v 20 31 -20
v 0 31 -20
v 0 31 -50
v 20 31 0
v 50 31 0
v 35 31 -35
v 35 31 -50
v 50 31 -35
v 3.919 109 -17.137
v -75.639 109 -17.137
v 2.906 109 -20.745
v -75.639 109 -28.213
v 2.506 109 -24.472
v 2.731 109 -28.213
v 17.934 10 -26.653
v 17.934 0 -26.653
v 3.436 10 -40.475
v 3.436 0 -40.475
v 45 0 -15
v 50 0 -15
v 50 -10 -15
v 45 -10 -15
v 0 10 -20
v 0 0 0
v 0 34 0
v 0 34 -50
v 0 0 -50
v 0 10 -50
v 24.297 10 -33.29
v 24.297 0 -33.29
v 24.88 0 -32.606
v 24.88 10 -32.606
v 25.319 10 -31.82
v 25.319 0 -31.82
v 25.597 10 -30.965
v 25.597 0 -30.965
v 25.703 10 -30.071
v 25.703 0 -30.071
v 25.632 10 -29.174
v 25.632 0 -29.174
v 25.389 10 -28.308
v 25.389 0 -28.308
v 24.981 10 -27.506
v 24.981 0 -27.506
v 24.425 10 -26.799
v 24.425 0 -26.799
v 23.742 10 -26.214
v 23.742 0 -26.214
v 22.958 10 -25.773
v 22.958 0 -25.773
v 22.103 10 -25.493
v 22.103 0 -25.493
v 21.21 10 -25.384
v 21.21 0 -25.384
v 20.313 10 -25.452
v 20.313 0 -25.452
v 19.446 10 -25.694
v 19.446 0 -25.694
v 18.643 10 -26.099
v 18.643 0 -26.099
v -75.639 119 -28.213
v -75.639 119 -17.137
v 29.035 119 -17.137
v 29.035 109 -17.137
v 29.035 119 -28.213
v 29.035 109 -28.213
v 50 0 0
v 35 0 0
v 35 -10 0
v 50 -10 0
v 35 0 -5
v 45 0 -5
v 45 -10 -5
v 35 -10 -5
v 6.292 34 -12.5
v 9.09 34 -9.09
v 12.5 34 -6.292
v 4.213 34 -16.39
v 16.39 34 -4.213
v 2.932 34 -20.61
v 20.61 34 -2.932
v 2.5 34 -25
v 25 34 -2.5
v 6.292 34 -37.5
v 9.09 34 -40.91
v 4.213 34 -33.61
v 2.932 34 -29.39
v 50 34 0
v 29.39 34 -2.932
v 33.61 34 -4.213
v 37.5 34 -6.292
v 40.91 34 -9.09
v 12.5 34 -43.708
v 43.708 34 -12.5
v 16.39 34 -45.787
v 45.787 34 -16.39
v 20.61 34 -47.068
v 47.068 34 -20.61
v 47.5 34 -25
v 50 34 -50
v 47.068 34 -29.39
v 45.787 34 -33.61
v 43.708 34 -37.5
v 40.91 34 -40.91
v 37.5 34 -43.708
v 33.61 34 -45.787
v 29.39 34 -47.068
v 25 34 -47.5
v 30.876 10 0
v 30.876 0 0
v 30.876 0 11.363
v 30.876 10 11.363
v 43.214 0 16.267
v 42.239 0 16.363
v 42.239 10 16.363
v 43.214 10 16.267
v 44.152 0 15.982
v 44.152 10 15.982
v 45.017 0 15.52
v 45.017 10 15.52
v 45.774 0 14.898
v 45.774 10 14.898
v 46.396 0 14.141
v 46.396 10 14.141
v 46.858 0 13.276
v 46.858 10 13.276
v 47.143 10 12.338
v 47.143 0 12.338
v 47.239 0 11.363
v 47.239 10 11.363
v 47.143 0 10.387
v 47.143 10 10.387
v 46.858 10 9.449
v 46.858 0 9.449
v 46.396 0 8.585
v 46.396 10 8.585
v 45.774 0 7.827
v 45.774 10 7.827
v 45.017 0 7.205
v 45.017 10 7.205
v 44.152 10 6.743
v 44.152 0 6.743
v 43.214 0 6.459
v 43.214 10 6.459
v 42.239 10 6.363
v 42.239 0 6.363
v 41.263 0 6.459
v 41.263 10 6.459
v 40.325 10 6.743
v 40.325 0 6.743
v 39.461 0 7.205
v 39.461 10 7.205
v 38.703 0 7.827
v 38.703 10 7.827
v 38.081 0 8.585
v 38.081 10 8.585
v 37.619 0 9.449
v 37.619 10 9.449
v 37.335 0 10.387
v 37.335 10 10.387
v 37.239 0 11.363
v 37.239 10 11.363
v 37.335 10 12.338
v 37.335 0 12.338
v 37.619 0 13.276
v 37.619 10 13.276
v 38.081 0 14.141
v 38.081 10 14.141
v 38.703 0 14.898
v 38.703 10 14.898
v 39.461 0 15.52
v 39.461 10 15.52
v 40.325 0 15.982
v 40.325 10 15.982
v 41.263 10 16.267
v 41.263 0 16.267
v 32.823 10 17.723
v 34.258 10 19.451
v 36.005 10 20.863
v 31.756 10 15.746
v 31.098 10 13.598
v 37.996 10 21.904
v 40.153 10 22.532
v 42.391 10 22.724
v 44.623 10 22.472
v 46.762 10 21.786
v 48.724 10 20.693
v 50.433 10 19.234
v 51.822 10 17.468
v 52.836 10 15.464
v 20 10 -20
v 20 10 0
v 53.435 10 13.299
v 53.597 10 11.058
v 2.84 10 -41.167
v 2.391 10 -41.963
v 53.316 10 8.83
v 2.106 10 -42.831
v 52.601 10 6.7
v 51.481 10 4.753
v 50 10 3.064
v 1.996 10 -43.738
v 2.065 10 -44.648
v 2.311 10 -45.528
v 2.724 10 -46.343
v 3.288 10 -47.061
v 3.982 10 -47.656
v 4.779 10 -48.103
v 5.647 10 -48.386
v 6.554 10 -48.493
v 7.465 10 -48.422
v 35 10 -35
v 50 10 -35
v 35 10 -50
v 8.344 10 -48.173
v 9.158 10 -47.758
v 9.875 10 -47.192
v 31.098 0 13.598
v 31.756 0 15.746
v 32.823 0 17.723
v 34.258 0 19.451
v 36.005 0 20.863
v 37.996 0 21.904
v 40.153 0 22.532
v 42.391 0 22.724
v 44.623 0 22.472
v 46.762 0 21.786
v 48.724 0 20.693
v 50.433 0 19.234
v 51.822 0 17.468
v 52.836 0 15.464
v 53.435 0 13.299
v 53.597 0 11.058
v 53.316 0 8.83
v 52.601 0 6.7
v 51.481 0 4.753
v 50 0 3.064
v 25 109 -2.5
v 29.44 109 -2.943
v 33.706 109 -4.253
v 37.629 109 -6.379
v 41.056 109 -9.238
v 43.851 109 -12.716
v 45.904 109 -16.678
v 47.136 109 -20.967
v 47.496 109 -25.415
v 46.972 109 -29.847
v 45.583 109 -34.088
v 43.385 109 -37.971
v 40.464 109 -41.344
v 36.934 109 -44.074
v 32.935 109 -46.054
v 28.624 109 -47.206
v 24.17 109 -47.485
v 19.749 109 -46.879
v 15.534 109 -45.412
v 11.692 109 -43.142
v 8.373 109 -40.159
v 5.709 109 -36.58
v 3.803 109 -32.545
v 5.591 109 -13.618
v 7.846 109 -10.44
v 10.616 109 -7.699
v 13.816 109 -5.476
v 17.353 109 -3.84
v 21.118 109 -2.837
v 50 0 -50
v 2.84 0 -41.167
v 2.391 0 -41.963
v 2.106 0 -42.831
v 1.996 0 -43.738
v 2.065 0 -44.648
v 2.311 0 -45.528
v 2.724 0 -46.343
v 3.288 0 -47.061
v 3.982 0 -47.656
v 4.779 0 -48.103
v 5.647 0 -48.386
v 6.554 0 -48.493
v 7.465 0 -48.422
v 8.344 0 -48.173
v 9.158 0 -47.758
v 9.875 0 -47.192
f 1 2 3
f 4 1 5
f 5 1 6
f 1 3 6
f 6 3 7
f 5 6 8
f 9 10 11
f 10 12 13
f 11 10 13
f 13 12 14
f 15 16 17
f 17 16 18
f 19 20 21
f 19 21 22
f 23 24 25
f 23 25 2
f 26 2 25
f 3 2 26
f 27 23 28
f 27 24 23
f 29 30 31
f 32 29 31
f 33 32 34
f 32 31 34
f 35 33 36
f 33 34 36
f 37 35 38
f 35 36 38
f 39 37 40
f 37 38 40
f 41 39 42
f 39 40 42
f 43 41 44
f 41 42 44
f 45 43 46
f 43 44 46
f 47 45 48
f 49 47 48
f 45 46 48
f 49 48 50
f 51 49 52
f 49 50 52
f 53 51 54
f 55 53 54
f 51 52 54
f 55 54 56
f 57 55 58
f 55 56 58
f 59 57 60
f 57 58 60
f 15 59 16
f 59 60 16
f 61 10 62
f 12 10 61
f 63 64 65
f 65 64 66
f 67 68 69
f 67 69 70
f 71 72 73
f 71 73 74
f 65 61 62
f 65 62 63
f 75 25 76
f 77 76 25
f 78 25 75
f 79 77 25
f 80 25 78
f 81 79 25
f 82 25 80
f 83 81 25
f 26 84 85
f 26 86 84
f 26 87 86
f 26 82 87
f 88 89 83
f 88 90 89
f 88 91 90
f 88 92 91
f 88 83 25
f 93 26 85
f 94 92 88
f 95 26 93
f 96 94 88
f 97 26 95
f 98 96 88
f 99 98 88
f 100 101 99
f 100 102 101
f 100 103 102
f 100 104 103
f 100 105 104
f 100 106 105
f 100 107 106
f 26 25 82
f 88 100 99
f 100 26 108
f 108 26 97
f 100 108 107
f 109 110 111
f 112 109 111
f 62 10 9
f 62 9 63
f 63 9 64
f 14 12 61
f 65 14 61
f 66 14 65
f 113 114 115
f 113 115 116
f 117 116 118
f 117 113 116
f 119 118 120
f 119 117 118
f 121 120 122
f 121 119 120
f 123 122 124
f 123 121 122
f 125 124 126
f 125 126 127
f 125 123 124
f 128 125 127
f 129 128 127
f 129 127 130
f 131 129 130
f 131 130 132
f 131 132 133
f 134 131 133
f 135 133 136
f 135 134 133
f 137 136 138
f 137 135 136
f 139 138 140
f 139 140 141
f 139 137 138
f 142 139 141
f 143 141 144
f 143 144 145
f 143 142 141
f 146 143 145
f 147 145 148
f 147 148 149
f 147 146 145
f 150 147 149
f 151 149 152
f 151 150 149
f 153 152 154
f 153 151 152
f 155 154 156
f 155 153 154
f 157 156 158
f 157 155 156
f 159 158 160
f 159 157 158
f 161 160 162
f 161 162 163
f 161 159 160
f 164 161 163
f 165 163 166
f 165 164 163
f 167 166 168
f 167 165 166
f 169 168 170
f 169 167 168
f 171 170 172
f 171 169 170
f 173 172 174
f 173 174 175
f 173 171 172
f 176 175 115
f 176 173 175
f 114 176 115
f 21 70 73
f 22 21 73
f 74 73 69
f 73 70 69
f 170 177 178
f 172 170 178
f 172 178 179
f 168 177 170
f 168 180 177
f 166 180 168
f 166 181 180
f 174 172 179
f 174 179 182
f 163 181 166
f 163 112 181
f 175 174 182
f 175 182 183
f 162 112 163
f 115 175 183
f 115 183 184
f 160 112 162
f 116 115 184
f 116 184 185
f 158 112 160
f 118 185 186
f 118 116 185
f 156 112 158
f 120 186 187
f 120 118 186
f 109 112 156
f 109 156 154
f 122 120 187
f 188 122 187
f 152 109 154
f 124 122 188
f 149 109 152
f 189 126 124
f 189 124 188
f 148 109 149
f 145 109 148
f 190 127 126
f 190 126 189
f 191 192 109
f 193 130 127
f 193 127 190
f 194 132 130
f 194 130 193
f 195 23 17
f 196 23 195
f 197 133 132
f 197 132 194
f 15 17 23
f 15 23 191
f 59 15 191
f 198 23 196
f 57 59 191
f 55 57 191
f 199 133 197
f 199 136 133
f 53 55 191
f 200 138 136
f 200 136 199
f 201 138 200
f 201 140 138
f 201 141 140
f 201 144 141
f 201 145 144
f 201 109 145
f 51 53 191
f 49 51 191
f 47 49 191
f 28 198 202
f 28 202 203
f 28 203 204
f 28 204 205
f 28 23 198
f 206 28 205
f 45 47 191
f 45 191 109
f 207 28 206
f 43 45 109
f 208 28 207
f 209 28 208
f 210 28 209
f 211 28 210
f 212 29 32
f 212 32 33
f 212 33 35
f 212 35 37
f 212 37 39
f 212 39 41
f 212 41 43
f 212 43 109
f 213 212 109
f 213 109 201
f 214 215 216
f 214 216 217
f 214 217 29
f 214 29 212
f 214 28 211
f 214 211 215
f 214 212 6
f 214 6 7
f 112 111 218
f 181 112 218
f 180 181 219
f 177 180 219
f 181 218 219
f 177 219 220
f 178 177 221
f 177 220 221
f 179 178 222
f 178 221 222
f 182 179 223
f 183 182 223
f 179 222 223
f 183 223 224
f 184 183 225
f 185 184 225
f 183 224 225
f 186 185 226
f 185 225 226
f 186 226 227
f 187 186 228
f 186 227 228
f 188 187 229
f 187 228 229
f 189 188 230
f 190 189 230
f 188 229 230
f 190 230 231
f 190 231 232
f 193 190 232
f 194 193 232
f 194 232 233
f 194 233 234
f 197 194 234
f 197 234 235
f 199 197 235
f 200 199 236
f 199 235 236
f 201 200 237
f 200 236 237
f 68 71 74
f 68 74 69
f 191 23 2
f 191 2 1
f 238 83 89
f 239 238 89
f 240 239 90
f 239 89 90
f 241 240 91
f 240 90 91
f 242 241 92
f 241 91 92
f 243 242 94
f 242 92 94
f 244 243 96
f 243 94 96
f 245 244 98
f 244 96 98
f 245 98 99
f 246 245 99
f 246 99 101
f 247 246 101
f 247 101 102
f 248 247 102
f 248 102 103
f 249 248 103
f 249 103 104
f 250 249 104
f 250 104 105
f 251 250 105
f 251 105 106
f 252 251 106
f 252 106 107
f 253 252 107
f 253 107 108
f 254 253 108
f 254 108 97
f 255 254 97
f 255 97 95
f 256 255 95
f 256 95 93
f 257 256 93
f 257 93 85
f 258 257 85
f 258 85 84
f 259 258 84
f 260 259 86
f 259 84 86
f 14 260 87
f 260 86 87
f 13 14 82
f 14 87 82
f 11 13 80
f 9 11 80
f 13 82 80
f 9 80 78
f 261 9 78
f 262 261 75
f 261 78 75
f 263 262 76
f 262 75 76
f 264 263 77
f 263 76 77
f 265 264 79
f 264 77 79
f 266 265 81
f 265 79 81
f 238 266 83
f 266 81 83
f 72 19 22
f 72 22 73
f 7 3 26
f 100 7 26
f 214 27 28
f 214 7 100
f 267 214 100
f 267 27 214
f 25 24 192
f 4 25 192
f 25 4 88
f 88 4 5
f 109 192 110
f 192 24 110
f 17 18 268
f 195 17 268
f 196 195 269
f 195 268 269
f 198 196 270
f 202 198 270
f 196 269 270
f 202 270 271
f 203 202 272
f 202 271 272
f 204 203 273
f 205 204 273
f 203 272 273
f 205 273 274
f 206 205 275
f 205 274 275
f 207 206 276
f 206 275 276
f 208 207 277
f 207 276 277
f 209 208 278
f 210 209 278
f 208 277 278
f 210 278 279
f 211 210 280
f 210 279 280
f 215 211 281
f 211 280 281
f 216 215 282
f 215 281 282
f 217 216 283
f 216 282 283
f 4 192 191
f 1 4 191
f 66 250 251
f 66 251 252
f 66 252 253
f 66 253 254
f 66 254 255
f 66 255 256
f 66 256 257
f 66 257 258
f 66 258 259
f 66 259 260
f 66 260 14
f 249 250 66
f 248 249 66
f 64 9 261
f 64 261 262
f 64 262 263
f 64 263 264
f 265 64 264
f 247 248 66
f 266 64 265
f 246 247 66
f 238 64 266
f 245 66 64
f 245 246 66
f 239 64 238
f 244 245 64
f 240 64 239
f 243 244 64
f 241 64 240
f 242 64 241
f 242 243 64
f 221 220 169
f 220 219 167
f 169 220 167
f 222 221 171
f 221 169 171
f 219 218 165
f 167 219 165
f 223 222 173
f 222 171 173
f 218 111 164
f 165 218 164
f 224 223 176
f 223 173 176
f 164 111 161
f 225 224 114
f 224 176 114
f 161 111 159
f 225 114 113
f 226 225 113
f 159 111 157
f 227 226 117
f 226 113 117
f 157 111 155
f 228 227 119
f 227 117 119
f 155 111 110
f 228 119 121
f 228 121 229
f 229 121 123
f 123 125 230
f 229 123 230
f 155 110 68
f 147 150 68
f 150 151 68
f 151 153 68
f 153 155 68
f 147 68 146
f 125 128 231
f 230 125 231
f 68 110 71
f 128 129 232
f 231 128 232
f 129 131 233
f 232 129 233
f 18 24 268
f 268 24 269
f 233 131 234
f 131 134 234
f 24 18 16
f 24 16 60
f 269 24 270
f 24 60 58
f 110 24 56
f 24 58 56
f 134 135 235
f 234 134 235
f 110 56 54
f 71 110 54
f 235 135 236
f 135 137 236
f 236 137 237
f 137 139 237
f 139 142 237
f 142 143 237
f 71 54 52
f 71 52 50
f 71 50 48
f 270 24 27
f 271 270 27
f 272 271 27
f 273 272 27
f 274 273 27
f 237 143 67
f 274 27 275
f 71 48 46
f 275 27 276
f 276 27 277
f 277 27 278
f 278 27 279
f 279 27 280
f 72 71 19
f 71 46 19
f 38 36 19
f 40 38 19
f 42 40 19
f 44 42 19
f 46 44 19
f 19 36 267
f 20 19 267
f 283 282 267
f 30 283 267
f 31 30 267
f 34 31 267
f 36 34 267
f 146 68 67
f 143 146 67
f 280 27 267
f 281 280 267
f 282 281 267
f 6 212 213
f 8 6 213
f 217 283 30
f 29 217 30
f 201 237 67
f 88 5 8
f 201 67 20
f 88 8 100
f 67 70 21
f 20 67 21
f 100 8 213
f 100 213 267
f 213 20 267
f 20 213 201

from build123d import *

# Parameters (mm, degrees)
SKETCH1_R           = 5
BOSS_EXTRUDE1_DEPTH = 10
BOSS_EXTRUDE2_DEPTH = 10
SKETCH3_W           = 20
SKETCH3_H           = 20
SKETCH3_W_2         = 15
SKETCH3_H_2         = 15
BOSS_EXTRUDE3_DEPTH = 21
SKETCH4_W           = 50
SKETCH4_H           = 50
BOSS_EXTRUDE4_DEPTH = 3
SKETCH5_R           = 22.5
BOSS_EXTRUDE5_DEPTH = 75
SKETCH6_W           = 104.673759345
SKETCH6_H           = 11.076222709
BOSS_EXTRUDE6_DEPTH = 10


with BuildPart() as part:
    # Sketch1 → Boss-Extrude1 (new body)
    with BuildSketch(Plane(origin=(0, 0, 0), x_dir=(1, 0, 0), z_dir=(0, 1, 0))):
        with BuildLine():
            Line((0, 0), (30.876052193, 0))
            Line((30.876052193, 0), (30.876052193, -11.362717468))
            ThreePointArc((30.876052193, -11.362717468), (46.762190972, -21.786248919), (50, -3.063642105))
            Line((50, -3.063642105), (50, 0))
            Line((50, 0), (50, 50))
            Line((50, 50), (0, 50))
            Line((0, 50), (0, 0))
        make_face()
        with Locations(Location((42.238769661, -11.362717468, 0), (0, 0, 270))):
            Circle(SKETCH1_R, mode=Mode.SUBTRACT)
        with BuildLine():
            Line((9.874654059, 47.191553979), (24.296746366, 33.290272916))
            ThreePointArc((24.296746366, 33.290272916), (24.424993645, 26.799159409), (17.934255558, 26.653142217))
            Line((17.934255558, 26.653142217), (3.436266044, 40.475249935))
            ThreePointArc((3.436266044, 40.475249935), (3.288101967, 47.061421086), (9.874654059, 47.191553979))
        make_face(mode=Mode.SUBTRACT)
    extrude(amount=BOSS_EXTRUDE1_DEPTH)

    # Sketch2 → Boss-Extrude2 (add)
    with BuildSketch(Plane.XZ):
        Polygon((45, -5), (35, -5), (35, 0), (50, 0), (50, -15), (45, -15), align=None)
    extrude(amount=BOSS_EXTRUDE2_DEPTH)

    # Sketch3 → Boss-Extrude3 (add)
    with BuildSketch(Plane(origin=(0, 10, 0), x_dir=(1, 0, 0), z_dir=(0, 1, 0))):
        with Locations((10, 10)):
            Rectangle(SKETCH3_W, SKETCH3_H)
        with Locations((42.5, 42.5)):
            Rectangle(SKETCH3_W_2, SKETCH3_H_2)
    extrude(amount=BOSS_EXTRUDE3_DEPTH)

    # Sketch4 → Boss-Extrude4 (add)
    with BuildSketch(Plane(origin=(0, 31, 0), x_dir=(1, 0, 0), z_dir=(0, 1, 0))):
        with Locations((25, 25)):
            Rectangle(SKETCH4_W, SKETCH4_H)
    extrude(amount=BOSS_EXTRUDE4_DEPTH)

    # Sketch5 → Boss-Extrude5 (add)
    with BuildSketch(Plane(origin=(0, 34, 0), x_dir=(1, 0, 0), z_dir=(0, 1, 0))):
        with Locations(Location((25, 25, 0), (0, 0, 270))):
            Circle(SKETCH5_R)
    extrude(amount=BOSS_EXTRUDE5_DEPTH)

    # Sketch6 → Boss-Extrude6 (add)
    with BuildSketch(Plane(origin=(0, 109, 0), x_dir=(1, 0, 0), z_dir=(0, 1, 0))):
        with Locations((-23.301664344, 22.675113634)):
            Rectangle(SKETCH6_W, SKETCH6_H)
    extrude(amount=BOSS_EXTRUDE6_DEPTH)


solid = part.part
